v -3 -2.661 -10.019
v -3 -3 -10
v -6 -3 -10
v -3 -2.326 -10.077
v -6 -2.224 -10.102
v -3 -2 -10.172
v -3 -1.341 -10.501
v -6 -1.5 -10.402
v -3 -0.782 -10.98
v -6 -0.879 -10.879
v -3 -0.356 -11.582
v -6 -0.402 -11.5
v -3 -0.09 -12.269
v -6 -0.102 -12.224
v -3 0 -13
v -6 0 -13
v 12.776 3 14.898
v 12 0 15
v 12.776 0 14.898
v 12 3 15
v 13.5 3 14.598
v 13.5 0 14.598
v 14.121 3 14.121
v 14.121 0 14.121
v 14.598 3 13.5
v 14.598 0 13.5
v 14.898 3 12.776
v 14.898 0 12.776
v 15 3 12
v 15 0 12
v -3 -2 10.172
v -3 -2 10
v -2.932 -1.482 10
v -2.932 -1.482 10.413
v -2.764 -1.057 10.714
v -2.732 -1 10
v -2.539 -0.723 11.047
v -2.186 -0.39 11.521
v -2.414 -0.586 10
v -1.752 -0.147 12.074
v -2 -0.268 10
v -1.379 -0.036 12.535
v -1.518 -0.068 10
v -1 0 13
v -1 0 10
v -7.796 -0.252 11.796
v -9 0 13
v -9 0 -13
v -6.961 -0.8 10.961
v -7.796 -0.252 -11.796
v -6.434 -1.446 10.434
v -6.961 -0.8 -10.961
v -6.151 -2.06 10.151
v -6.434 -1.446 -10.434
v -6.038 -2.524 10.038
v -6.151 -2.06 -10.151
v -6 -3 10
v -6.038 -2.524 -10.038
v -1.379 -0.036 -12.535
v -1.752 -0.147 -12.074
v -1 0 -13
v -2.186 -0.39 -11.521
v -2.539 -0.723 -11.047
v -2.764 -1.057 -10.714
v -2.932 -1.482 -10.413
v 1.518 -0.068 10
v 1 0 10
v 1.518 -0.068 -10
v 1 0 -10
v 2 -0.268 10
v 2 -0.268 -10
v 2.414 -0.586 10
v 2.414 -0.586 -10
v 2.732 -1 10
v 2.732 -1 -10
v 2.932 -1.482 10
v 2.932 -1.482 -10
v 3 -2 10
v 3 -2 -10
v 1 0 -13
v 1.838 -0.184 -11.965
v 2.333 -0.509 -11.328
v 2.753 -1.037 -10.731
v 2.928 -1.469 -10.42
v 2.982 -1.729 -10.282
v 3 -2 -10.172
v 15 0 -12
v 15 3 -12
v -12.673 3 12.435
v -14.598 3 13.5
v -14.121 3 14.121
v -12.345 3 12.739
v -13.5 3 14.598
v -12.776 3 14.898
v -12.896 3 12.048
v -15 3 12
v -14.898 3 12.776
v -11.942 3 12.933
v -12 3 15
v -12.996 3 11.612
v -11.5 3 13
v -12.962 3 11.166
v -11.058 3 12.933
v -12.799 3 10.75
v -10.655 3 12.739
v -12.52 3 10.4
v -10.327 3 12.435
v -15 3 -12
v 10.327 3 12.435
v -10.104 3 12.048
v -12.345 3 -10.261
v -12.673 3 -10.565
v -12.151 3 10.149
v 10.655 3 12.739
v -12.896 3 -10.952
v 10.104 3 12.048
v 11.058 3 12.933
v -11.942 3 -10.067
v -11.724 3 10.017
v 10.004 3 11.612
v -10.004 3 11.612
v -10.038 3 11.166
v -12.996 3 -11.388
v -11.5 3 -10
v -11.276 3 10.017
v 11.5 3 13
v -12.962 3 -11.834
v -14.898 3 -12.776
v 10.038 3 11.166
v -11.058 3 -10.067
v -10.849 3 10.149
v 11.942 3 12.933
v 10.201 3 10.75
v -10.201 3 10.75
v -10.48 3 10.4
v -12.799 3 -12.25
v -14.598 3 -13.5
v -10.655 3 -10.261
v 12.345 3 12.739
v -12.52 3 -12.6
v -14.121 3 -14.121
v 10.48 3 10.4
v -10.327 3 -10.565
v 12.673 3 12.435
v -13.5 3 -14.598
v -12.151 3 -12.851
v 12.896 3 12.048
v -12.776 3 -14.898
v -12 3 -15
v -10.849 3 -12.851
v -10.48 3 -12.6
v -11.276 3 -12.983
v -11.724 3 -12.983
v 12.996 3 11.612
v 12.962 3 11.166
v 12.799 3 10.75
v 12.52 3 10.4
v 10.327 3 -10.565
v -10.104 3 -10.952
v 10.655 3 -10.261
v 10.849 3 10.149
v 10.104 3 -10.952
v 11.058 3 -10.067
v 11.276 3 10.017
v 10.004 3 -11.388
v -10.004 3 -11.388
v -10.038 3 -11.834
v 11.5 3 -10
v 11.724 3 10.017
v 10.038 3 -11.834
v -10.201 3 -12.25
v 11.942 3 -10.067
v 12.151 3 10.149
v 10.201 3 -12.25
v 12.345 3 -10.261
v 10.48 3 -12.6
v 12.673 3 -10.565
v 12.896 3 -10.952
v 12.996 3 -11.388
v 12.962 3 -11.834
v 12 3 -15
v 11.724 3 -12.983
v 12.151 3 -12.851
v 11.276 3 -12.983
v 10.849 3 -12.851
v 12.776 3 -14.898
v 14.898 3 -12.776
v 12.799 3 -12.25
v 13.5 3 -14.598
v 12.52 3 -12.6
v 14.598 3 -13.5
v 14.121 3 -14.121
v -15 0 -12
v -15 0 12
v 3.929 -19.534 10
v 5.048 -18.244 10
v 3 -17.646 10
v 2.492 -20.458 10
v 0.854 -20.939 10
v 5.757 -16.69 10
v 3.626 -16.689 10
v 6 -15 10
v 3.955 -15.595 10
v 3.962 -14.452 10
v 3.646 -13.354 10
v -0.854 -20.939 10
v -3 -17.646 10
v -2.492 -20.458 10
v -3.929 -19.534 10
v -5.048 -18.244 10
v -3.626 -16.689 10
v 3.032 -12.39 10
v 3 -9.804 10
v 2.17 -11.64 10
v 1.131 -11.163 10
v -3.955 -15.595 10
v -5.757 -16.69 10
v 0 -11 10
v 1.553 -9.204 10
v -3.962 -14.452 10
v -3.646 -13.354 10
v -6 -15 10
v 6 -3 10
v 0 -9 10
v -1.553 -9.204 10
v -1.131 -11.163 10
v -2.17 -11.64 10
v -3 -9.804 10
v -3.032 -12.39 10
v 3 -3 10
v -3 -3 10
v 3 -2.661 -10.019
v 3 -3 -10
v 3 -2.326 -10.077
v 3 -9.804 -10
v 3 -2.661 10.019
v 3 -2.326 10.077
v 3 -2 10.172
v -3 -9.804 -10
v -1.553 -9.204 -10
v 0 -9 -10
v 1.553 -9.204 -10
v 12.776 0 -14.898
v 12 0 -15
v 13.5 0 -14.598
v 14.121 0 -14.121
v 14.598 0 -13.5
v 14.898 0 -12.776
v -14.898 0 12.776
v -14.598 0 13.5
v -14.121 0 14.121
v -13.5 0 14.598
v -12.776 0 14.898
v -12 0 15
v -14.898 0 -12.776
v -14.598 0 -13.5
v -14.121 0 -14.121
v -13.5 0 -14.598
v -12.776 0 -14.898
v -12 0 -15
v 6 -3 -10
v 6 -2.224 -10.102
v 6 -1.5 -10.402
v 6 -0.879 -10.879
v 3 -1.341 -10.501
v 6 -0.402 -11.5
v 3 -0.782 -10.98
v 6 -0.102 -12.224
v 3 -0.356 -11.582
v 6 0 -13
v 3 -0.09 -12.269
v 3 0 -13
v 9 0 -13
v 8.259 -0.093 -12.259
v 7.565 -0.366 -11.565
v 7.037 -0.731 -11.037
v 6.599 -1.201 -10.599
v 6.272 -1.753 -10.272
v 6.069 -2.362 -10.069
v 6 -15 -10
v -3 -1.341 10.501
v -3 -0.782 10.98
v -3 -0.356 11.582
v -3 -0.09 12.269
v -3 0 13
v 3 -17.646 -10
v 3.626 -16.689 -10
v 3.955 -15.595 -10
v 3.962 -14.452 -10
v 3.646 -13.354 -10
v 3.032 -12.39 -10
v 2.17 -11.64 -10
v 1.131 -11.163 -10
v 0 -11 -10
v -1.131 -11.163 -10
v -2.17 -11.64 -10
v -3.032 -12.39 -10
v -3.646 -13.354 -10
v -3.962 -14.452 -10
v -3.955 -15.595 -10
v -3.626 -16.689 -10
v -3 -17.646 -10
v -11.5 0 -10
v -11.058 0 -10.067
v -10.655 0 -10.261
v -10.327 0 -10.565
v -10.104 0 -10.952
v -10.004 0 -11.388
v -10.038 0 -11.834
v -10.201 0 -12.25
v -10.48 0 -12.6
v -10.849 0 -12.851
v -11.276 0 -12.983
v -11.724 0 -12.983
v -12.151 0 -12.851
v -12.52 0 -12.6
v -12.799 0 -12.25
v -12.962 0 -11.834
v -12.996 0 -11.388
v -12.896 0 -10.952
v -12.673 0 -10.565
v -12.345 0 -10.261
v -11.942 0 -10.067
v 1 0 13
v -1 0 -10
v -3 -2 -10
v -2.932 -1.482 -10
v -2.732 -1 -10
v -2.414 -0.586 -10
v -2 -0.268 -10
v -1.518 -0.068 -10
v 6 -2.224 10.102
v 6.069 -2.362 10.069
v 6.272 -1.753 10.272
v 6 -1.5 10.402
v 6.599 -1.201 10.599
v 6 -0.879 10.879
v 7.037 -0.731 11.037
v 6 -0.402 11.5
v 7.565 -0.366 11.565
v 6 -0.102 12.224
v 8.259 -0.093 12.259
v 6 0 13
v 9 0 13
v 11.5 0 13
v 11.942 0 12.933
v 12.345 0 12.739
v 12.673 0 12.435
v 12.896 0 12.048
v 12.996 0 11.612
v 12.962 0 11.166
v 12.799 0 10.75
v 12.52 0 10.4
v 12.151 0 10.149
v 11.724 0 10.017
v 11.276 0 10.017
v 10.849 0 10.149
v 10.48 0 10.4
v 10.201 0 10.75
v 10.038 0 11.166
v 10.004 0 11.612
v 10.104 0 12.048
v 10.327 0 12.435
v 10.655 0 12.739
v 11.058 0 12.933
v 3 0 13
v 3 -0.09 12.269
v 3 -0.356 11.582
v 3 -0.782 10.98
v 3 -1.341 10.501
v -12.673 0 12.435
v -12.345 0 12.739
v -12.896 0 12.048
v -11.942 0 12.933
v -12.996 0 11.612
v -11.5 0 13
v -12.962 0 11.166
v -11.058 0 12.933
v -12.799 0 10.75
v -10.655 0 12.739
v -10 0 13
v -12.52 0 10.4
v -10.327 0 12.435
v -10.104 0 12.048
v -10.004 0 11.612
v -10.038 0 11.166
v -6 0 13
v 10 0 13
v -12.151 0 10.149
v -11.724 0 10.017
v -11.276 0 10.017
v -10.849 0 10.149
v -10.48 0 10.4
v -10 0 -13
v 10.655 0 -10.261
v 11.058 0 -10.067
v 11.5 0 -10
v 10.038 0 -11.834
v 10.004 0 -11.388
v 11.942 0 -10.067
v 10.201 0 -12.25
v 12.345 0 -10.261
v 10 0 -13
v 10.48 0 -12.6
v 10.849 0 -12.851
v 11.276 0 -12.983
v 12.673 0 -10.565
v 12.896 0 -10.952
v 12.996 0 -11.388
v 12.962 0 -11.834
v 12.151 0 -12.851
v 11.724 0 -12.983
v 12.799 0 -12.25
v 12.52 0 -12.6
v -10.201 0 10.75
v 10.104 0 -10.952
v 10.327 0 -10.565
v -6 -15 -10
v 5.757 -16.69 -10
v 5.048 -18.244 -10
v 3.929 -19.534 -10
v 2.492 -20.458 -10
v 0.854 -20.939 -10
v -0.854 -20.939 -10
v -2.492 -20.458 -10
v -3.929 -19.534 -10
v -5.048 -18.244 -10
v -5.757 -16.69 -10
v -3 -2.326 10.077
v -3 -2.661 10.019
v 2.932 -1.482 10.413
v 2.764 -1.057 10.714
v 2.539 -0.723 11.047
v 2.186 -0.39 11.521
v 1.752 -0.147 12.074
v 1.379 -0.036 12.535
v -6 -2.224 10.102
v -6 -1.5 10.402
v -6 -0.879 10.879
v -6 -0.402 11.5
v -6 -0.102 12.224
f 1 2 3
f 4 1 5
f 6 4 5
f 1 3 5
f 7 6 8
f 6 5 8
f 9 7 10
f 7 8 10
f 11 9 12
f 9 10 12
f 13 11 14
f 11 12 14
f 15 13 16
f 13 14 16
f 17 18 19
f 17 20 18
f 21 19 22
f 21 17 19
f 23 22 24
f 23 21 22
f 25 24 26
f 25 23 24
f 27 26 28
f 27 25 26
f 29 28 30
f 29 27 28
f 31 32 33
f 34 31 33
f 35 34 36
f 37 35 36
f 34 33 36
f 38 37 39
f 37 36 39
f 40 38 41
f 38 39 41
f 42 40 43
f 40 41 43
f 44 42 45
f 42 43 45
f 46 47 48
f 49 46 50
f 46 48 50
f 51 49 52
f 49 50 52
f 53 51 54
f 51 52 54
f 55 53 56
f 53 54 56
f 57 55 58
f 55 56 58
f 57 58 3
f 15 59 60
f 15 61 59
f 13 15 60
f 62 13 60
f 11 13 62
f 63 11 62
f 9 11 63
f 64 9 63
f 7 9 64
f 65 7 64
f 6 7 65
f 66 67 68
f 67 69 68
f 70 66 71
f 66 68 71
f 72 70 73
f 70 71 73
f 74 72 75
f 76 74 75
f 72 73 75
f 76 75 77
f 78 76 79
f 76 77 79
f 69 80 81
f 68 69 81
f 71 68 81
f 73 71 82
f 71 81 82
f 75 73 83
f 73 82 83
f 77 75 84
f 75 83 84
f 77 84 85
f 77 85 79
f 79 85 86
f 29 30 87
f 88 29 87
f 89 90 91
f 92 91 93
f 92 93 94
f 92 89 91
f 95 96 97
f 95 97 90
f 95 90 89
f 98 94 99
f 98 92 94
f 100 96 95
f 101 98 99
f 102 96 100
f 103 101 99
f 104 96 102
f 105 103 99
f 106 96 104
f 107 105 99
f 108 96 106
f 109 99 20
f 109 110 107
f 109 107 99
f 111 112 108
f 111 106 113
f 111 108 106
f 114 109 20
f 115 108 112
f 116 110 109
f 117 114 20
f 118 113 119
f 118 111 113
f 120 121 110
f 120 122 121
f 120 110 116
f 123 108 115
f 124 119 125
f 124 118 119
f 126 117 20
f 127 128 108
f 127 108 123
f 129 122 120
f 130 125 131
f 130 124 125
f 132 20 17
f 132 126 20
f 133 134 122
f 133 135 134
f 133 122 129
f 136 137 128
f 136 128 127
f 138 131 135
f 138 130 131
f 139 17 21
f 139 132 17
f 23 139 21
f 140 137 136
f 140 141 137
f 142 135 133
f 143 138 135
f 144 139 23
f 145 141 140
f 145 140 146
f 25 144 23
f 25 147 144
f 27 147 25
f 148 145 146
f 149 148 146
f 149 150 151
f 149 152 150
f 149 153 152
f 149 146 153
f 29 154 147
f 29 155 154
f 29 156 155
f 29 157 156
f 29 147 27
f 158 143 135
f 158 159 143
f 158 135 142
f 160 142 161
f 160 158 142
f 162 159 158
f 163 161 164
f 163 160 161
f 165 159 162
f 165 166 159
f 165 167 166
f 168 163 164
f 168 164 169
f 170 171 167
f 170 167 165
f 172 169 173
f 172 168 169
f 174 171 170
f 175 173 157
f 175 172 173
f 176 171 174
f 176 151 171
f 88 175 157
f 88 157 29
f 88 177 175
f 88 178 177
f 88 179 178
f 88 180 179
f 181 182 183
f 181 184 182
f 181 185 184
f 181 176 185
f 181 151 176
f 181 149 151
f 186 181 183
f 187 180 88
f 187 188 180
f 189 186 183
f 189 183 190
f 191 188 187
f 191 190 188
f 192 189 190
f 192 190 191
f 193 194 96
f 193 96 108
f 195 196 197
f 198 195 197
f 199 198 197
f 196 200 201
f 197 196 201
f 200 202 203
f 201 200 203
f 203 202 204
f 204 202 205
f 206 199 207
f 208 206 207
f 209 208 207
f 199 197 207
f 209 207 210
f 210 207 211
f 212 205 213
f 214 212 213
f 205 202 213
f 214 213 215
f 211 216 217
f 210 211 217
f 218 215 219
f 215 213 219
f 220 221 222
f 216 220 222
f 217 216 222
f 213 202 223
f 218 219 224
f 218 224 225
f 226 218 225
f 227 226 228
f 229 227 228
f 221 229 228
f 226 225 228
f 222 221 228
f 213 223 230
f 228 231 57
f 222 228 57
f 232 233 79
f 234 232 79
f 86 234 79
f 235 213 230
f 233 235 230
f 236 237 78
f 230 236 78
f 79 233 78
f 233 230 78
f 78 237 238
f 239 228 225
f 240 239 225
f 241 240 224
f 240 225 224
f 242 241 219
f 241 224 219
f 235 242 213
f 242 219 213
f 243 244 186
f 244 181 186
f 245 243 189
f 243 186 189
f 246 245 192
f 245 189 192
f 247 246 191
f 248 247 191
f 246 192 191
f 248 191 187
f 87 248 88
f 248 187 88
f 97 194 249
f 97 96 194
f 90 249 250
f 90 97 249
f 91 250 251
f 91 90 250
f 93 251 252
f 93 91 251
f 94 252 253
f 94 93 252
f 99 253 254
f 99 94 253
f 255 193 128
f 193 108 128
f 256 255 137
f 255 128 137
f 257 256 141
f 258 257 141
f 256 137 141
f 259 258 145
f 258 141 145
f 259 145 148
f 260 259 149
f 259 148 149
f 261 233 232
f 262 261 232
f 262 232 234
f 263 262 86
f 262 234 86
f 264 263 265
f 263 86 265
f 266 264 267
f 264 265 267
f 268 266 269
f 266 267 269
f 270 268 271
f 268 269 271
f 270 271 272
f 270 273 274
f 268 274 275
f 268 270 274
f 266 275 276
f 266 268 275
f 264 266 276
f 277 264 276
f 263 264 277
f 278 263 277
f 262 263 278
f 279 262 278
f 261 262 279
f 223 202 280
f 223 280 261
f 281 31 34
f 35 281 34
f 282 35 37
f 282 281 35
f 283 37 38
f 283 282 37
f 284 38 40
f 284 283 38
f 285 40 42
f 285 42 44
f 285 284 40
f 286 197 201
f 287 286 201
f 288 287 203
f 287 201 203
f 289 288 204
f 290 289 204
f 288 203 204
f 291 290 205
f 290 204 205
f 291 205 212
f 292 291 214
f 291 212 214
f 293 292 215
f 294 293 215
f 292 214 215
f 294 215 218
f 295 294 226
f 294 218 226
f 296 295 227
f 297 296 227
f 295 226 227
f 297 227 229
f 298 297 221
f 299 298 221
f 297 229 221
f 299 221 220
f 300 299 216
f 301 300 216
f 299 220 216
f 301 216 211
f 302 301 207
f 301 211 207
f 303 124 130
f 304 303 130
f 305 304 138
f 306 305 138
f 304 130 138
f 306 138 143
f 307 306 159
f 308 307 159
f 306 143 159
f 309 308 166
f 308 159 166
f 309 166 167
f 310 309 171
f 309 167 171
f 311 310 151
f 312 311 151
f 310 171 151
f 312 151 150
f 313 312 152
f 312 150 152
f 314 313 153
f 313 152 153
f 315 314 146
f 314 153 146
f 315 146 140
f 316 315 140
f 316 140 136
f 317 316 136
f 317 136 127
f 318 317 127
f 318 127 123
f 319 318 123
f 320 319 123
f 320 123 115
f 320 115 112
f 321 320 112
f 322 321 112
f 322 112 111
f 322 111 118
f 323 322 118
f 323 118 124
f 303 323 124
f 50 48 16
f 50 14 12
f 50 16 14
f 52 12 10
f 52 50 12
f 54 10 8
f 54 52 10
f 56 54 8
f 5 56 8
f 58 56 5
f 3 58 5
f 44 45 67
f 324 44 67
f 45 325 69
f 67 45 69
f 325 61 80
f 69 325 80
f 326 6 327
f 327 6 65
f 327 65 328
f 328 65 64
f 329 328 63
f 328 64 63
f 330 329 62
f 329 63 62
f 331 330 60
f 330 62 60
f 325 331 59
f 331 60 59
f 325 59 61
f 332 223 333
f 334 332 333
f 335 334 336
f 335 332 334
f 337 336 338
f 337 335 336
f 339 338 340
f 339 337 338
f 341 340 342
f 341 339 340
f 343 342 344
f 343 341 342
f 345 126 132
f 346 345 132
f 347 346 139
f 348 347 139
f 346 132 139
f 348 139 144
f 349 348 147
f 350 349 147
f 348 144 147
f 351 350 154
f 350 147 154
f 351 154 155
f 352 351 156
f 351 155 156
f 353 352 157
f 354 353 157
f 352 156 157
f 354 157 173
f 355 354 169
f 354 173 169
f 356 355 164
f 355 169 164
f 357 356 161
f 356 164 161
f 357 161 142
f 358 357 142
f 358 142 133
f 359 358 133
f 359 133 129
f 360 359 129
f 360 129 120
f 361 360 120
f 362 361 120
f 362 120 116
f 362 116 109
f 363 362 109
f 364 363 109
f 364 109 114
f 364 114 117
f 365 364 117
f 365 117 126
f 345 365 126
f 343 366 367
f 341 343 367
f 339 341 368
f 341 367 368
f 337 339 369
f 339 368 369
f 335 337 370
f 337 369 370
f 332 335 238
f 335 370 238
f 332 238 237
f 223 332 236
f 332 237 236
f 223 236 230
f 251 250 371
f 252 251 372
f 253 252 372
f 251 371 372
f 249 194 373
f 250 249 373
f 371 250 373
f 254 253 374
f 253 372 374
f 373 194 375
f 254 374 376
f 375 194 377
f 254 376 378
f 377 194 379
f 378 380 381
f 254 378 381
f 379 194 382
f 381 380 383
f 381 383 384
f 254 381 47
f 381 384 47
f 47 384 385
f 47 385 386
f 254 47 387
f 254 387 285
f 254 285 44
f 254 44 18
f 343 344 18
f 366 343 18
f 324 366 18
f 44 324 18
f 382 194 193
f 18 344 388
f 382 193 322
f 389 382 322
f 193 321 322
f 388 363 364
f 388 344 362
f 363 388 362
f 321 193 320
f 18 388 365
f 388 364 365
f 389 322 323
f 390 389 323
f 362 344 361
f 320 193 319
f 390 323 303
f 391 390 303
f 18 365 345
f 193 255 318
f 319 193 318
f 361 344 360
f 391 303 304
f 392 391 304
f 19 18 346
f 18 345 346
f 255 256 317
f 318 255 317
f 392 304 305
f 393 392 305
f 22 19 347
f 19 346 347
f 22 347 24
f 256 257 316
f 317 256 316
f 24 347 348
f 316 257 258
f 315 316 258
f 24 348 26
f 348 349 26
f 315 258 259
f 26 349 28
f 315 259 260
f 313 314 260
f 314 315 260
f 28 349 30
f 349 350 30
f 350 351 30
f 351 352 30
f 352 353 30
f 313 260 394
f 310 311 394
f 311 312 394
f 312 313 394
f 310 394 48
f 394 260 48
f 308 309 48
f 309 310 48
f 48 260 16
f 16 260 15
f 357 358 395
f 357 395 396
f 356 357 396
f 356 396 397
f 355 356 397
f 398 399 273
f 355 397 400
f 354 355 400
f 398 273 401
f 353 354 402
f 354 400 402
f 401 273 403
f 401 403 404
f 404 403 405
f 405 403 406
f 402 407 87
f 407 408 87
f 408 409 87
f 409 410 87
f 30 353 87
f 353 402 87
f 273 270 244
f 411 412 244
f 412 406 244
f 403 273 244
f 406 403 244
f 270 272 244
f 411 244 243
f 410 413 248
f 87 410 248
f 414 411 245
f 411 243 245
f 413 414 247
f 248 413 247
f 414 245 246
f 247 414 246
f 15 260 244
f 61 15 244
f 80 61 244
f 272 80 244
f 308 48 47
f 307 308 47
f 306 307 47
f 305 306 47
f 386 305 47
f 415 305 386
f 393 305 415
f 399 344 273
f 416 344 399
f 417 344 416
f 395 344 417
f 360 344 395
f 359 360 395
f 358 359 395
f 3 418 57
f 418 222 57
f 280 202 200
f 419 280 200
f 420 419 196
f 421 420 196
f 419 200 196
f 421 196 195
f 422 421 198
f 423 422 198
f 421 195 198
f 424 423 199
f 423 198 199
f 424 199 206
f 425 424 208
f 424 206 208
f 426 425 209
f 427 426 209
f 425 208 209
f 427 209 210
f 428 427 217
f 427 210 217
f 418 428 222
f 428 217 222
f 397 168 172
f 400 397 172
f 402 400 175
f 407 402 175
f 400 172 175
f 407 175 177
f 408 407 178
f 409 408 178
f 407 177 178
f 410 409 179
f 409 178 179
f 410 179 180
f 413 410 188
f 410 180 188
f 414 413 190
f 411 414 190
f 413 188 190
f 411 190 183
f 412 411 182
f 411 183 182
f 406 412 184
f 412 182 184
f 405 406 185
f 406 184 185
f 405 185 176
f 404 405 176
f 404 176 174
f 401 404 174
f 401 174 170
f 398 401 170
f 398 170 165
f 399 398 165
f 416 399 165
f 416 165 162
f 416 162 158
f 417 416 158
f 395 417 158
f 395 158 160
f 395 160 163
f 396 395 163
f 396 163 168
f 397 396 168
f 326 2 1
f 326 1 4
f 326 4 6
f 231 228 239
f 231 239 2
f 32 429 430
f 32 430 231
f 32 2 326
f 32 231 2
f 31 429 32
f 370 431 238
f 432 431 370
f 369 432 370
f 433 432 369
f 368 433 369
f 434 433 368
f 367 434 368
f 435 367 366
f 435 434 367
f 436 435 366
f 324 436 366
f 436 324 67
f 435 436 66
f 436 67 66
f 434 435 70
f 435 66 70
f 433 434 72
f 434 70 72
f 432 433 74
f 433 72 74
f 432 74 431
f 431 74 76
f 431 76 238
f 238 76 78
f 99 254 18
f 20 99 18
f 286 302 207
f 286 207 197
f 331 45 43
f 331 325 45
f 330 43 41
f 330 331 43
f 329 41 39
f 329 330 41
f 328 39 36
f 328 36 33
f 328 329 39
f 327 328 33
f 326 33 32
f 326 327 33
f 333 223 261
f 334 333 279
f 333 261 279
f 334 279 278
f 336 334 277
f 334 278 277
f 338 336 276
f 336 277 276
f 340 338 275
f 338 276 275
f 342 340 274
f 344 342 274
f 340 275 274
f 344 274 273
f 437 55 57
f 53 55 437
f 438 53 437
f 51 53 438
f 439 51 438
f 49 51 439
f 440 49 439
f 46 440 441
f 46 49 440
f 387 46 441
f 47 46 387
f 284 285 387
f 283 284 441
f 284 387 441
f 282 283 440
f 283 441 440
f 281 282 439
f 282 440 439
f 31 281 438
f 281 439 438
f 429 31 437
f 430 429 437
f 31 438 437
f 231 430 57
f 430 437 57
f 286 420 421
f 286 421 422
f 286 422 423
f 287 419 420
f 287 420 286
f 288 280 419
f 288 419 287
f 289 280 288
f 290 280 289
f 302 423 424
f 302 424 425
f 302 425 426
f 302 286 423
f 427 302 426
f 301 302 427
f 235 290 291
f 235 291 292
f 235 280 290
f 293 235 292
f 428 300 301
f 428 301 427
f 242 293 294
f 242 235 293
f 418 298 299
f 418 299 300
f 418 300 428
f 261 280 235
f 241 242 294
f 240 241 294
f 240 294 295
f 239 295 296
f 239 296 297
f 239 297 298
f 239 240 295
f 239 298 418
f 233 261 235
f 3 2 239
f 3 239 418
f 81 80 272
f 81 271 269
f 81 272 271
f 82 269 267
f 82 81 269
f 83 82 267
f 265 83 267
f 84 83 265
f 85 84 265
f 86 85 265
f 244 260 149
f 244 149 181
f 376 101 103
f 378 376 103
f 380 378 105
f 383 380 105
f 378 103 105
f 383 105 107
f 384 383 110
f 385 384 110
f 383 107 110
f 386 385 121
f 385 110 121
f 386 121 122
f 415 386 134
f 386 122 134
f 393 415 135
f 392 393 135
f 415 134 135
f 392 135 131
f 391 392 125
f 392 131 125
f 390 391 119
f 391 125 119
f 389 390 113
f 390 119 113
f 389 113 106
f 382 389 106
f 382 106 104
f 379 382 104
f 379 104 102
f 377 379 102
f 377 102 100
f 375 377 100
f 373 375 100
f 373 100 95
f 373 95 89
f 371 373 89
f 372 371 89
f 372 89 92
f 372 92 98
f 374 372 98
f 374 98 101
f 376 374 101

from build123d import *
from build123d.topology import SkipClean

# Parameters (mm, degrees)
CROQUIS1_W              = 30
CROQUIS1_H              = 30
SALIENTE_EXTRUIR1_DEPTH = 3
SALIENTE_EXTRUIR2_DEPTH = 20
CROQUIS4_R              = 1.5
CORTAR_EXTRUIR1_DEPTH   = 33.031234756
REDONDEO2_R             = 3
REDONDEO4_R             = 2
REDONDEO5_START         = -6
REDONDEO5_DEPTH         = 3
REDONDEO5_START_2       = 3
REDONDEO5_2_DEPTH       = 3
REDONDEO5_START_3       = -13.0000001
REDONDEO5_3_DEPTH       = 26.0000001
REDONDEO5_START_4       = -10
REDONDEO5_4_DEPTH       = 20


with BuildPart() as part:
    # Croquis1 → Saliente-Extruir1 (new body)
    with BuildSketch(Plane(origin=(0, 0, 0), x_dir=(1, 0, 0), z_dir=(0, 1, 0))):
        Rectangle(CROQUIS1_W, CROQUIS1_H)
    extrude(amount=SALIENTE_EXTRUIR1_DEPTH)

    # Croquis3 → Saliente-Extruir2 (add)
    with BuildSketch(Plane.XY.offset(10)):
        with BuildLine():
            Line((-3, 0), (-3, -9.803847577))
            ThreePointArc((-3, -9.803847577), (0, -9), (3, -9.803847577))
            Line((3, -9.803847577), (3, 0))
            Line((3, 0), (6, 0))
            Line((6, 0), (6, -15))
            ThreePointArc((6, -15), (0, -21), (-6, -15))
            Line((-6, -15), (-6, 0))
            Line((-6, 0), (-3, 0))
        make_face()
        with BuildLine():
            Line((-3, -17.645751311), (3, -17.645751311))
            ThreePointArc((3, -17.645751311), (0, -11), (-3, -17.645751311))
        make_face(mode=Mode.SUBTRACT)
    extrude(amount=-SALIENTE_EXTRUIR2_DEPTH)

    # Croquis4 → Cortar-Extruir1 (cut, through all)
    with BuildSketch(Plane(origin=(0, 3, 0), x_dir=(1, 0, 0), z_dir=(0, 1, 0))):
        with Locations(Location((-11.5, 11.5, 0), (0, 0, 270))):
            Circle(CROQUIS4_R)
        with Locations(Location((11.5, 11.5, 0), (0, 0, 270))):
            Circle(CROQUIS4_R)
        with Locations(Location((11.5, -11.5, 0), (0, 0, 270))):
            Circle(CROQUIS4_R)
        with Locations(Location((-11.5, -11.5, 0), (0, 0, 270))):
            Circle(CROQUIS4_R)
    extrude(amount=-CORTAR_EXTRUIR1_DEPTH, mode=Mode.SUBTRACT)

    # Redondeo2
    redondeo2_edges = [part.edges().sort_by_distance(p)[0] for p in [
        (-15, 1.5, -15),
        (15, 1.5, -15),
        (15, 1.5, 15),
        (-15, 1.5, 15),
    ]]
    fillet(redondeo2_edges, radius=REDONDEO2_R)

    # Redondeo4
    redondeo4_edges = [part.edges().sort_by_distance(p)[0] for p in [
        (-3, 0, 0),
        (3, 0, 0),
    ]]
    fillet(redondeo4_edges, radius=REDONDEO4_R)

    # Redondeo5: read off the stored shape, not the designer's step
    # Redondeo5 outline → Redondeo5 (add)
    with BuildSketch(Plane.YZ.offset(REDONDEO5_START)):
        with BuildLine():
            Line((0, -13), (0, -10))
            Line((0, -10), (-3, -10))
            ThreePointArc((-3, -10), (-0.878679656, -10.878679656), (0, -13))
        make_face()
        with BuildLine():
            ThreePointArc((0, 13), (-0.878679656, 10.878679656), (-3, 10))
            Line((-3, 10), (0, 10))
            Line((0, 10), (0, 13))
        make_face()
    extrude(amount=REDONDEO5_DEPTH)

    # Redondeo5 2 outline → Redondeo5 2 (add)
    with BuildSketch(Plane.YZ.offset(REDONDEO5_START_2)):
        with BuildLine():
            Line((0, -13), (0, -10))
            Line((0, -10), (-3, -10))
            ThreePointArc((-3, -10), (-0.878679656, -10.878679656), (0, -13))
        make_face()
        with BuildLine():
            ThreePointArc((0, 13), (-0.878679656, 10.878679656), (-3, 10))
            Line((-3, 10), (0, 10))
            Line((0, 10), (0, 13))
        make_face()
    extrude(amount=REDONDEO5_2_DEPTH)

    # Redondeo5 3 outline → Redondeo5 3 (add)
    with SkipClean():  # the faces are left unmerged after this step: merging them gives an invalid solid
        with BuildSketch(Plane.XY.offset(REDONDEO5_START_3)):
            with BuildLine():
                Line((-3, 0), (-3, -2))
                ThreePointArc((-3, -2), (-2.414213562, -0.585786438), (-1, 0))
                Line((-1, 0), (-3, 0))
            make_face()
            with BuildLine():
                Line((-6, -3), (-6, 0))
                Line((-6, 0), (-9, 0))
                ThreePointArc((-9, 0), (-6.878679656, -0.878679656), (-6, -3))
            make_face()
            with BuildLine():
                Line((9, 0), (6, 0))
                Line((6, 0), (6, -3))
                ThreePointArc((6, -3), (6.878679656, -0.878679656), (9, 0))
            make_face()
            with BuildLine():
                Line((3, 0), (1, 0))
                ThreePointArc((1, 0), (2.414213562, -0.585786438), (3, -2))
                Line((3, -2), (3, 0))
            make_face()
        extrude(amount=REDONDEO5_3_DEPTH)

    # Redondeo5 4 outline → Redondeo5 4 (cut)
    with SkipClean():  # the faces are left unmerged after this step: merging them gives an invalid solid
        with BuildSketch(Plane.YZ.offset(REDONDEO5_START_4)):
            with BuildLine():
                ThreePointArc((0, -13.00000005), (-0.878679638, -10.878679674), (-3, -10))
                Line((-3, -10), (-3, -13.0000001))
                Line((-3, -13.0000001), (0, -13.00000005))
            make_face()
            with BuildLine():
                Line((0, 13), (-3, 13))
                Line((-3, 13), (-3, 10))
                ThreePointArc((-3, 10), (-0.878679656, 10.878679656), (0, 13))
            make_face()
        extrude(amount=REDONDEO5_4_DEPTH, mode=Mode.SUBTRACT)


solid = part.part
